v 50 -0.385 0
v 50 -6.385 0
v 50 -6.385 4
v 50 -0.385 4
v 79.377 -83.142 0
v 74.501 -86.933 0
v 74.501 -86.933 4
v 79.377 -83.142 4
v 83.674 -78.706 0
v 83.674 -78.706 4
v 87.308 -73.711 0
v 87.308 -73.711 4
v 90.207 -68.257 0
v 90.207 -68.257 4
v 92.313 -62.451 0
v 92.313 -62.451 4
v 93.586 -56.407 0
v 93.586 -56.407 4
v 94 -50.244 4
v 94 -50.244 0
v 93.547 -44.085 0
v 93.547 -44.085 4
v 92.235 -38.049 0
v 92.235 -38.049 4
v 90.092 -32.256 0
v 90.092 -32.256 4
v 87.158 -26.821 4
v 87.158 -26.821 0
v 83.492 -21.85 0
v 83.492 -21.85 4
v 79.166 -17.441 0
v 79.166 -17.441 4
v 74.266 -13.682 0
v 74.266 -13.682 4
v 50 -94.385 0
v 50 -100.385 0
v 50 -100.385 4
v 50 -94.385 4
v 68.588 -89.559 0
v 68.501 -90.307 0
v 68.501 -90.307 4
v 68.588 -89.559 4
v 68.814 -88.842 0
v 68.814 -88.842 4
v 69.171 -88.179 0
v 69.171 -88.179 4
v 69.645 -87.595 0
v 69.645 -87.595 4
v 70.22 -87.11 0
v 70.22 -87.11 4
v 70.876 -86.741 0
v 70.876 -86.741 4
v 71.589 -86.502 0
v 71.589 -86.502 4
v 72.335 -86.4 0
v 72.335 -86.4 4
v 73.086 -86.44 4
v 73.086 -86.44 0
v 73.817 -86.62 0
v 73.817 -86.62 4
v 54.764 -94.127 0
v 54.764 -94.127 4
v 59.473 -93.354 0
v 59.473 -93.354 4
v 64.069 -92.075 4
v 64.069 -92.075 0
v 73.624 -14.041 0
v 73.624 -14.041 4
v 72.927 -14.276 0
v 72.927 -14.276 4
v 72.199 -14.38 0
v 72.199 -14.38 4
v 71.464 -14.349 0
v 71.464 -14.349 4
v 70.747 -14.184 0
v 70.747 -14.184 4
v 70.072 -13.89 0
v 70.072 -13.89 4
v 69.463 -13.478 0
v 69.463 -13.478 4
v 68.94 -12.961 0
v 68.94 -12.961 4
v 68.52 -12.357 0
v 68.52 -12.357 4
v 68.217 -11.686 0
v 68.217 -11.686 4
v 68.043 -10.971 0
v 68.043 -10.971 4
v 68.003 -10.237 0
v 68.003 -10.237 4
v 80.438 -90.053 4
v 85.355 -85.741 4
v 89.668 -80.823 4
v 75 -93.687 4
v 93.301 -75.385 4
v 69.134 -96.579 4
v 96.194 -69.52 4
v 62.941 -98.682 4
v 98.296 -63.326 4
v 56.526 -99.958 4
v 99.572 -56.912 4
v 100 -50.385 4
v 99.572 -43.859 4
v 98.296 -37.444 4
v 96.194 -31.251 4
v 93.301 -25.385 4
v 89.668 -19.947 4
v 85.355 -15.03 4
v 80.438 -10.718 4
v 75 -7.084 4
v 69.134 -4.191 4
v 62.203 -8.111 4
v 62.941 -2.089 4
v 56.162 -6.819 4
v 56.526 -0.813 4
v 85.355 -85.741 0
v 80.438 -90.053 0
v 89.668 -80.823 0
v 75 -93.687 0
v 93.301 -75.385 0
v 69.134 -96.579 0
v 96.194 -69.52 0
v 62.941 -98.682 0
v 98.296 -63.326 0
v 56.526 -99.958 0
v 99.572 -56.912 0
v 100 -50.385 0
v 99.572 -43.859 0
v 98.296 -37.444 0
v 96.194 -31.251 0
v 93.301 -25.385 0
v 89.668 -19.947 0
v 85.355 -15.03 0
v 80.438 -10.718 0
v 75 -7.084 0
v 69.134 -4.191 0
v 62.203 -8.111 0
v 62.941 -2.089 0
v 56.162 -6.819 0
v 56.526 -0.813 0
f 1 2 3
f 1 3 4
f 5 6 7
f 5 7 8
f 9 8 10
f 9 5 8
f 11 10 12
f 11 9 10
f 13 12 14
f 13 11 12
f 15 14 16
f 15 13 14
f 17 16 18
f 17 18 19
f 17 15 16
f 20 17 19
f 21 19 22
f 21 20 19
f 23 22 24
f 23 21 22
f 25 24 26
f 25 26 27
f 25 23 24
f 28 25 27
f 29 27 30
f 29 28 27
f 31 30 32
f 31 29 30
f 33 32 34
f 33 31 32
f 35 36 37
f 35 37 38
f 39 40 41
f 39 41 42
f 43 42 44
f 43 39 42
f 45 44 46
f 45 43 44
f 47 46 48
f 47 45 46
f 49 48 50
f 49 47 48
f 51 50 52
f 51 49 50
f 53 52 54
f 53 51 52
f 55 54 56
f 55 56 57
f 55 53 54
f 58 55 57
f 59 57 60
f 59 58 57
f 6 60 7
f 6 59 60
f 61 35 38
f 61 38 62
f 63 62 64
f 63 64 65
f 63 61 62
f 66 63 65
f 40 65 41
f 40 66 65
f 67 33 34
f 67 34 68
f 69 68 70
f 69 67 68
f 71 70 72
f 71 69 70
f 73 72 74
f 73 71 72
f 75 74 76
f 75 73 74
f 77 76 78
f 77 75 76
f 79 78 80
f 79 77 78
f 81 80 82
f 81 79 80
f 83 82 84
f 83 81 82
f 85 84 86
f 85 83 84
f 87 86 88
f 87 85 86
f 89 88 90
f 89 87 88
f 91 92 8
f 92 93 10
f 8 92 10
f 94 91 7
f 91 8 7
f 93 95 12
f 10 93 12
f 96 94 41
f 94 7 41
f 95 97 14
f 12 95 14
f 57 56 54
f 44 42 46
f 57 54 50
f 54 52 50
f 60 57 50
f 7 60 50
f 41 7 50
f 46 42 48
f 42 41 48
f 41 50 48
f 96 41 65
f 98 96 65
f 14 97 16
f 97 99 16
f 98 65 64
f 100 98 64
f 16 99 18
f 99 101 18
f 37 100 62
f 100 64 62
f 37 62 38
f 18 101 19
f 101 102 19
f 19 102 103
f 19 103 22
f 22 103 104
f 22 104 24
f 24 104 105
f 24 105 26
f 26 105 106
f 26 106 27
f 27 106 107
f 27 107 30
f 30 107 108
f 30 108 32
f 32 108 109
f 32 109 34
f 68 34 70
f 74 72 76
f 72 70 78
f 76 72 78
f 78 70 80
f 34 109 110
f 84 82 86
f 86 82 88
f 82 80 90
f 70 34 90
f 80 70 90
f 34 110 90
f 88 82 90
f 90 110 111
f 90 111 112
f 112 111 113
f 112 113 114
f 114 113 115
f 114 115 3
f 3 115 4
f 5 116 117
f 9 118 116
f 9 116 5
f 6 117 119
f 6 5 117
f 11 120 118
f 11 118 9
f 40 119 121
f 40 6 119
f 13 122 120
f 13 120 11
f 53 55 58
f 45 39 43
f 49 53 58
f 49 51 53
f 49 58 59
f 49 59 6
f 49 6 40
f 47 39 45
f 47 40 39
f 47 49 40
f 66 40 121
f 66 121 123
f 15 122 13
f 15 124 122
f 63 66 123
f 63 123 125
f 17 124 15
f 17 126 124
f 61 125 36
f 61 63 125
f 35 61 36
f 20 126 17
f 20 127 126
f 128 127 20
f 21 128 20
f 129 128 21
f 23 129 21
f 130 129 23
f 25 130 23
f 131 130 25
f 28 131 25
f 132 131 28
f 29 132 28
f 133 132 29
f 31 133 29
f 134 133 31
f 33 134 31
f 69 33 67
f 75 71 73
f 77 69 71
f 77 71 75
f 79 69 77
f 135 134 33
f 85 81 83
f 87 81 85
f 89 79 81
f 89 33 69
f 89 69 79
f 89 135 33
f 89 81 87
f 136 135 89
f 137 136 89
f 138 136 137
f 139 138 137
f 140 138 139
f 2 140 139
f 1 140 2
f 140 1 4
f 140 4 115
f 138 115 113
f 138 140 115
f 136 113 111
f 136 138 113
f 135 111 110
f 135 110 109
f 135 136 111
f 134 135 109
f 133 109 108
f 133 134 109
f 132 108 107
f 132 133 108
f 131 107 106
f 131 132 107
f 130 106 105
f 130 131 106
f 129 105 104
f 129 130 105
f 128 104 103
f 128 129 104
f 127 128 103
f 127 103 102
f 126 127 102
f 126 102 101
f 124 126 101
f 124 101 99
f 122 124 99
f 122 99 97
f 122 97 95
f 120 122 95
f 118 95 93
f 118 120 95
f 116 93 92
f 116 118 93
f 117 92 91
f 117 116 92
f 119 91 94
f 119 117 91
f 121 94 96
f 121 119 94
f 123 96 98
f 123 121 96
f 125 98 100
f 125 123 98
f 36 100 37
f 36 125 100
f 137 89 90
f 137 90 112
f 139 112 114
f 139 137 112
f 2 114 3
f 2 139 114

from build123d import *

# Parameters (mm, degrees)
SALIENTE_EXTRUIR2_DEPTH = 4


with BuildPart() as part:
    # Croquis1 → Saliente-Extruir2 (new body)
    with BuildSketch(Plane.XY):
        with BuildLine():
            Line((50, -100.385371697), (50, -94.385371697))
            ThreePointArc((50, -94.385371697), (59.472562128, -93.35362238), (68.500882915, -90.306761094))
            ThreePointArc((68.500882915, -90.306761094), (70.539255421, -86.910059757), (74.500570941, -86.932902716))
            ThreePointArc((74.500570941, -86.932902716), (93.999774318, -50.244446404), (74.265957135, -13.681648121))
            ThreePointArc((74.265957135, -13.681648121), (70.072325001, -13.890235332), (68.002756877, -10.23688798))
            ThreePointArc((68.002756877, -10.23688798), (59.205072417, -7.35902347), (50, -6.385371697))
            Line((50, -6.385371697), (50, -0.385371697))
            ThreePointArc((50, -0.385371697), (100, -50.385371697), (50, -100.385371697))
        make_face()
    extrude(amount=SALIENTE_EXTRUIR2_DEPTH)


solid = part.part
